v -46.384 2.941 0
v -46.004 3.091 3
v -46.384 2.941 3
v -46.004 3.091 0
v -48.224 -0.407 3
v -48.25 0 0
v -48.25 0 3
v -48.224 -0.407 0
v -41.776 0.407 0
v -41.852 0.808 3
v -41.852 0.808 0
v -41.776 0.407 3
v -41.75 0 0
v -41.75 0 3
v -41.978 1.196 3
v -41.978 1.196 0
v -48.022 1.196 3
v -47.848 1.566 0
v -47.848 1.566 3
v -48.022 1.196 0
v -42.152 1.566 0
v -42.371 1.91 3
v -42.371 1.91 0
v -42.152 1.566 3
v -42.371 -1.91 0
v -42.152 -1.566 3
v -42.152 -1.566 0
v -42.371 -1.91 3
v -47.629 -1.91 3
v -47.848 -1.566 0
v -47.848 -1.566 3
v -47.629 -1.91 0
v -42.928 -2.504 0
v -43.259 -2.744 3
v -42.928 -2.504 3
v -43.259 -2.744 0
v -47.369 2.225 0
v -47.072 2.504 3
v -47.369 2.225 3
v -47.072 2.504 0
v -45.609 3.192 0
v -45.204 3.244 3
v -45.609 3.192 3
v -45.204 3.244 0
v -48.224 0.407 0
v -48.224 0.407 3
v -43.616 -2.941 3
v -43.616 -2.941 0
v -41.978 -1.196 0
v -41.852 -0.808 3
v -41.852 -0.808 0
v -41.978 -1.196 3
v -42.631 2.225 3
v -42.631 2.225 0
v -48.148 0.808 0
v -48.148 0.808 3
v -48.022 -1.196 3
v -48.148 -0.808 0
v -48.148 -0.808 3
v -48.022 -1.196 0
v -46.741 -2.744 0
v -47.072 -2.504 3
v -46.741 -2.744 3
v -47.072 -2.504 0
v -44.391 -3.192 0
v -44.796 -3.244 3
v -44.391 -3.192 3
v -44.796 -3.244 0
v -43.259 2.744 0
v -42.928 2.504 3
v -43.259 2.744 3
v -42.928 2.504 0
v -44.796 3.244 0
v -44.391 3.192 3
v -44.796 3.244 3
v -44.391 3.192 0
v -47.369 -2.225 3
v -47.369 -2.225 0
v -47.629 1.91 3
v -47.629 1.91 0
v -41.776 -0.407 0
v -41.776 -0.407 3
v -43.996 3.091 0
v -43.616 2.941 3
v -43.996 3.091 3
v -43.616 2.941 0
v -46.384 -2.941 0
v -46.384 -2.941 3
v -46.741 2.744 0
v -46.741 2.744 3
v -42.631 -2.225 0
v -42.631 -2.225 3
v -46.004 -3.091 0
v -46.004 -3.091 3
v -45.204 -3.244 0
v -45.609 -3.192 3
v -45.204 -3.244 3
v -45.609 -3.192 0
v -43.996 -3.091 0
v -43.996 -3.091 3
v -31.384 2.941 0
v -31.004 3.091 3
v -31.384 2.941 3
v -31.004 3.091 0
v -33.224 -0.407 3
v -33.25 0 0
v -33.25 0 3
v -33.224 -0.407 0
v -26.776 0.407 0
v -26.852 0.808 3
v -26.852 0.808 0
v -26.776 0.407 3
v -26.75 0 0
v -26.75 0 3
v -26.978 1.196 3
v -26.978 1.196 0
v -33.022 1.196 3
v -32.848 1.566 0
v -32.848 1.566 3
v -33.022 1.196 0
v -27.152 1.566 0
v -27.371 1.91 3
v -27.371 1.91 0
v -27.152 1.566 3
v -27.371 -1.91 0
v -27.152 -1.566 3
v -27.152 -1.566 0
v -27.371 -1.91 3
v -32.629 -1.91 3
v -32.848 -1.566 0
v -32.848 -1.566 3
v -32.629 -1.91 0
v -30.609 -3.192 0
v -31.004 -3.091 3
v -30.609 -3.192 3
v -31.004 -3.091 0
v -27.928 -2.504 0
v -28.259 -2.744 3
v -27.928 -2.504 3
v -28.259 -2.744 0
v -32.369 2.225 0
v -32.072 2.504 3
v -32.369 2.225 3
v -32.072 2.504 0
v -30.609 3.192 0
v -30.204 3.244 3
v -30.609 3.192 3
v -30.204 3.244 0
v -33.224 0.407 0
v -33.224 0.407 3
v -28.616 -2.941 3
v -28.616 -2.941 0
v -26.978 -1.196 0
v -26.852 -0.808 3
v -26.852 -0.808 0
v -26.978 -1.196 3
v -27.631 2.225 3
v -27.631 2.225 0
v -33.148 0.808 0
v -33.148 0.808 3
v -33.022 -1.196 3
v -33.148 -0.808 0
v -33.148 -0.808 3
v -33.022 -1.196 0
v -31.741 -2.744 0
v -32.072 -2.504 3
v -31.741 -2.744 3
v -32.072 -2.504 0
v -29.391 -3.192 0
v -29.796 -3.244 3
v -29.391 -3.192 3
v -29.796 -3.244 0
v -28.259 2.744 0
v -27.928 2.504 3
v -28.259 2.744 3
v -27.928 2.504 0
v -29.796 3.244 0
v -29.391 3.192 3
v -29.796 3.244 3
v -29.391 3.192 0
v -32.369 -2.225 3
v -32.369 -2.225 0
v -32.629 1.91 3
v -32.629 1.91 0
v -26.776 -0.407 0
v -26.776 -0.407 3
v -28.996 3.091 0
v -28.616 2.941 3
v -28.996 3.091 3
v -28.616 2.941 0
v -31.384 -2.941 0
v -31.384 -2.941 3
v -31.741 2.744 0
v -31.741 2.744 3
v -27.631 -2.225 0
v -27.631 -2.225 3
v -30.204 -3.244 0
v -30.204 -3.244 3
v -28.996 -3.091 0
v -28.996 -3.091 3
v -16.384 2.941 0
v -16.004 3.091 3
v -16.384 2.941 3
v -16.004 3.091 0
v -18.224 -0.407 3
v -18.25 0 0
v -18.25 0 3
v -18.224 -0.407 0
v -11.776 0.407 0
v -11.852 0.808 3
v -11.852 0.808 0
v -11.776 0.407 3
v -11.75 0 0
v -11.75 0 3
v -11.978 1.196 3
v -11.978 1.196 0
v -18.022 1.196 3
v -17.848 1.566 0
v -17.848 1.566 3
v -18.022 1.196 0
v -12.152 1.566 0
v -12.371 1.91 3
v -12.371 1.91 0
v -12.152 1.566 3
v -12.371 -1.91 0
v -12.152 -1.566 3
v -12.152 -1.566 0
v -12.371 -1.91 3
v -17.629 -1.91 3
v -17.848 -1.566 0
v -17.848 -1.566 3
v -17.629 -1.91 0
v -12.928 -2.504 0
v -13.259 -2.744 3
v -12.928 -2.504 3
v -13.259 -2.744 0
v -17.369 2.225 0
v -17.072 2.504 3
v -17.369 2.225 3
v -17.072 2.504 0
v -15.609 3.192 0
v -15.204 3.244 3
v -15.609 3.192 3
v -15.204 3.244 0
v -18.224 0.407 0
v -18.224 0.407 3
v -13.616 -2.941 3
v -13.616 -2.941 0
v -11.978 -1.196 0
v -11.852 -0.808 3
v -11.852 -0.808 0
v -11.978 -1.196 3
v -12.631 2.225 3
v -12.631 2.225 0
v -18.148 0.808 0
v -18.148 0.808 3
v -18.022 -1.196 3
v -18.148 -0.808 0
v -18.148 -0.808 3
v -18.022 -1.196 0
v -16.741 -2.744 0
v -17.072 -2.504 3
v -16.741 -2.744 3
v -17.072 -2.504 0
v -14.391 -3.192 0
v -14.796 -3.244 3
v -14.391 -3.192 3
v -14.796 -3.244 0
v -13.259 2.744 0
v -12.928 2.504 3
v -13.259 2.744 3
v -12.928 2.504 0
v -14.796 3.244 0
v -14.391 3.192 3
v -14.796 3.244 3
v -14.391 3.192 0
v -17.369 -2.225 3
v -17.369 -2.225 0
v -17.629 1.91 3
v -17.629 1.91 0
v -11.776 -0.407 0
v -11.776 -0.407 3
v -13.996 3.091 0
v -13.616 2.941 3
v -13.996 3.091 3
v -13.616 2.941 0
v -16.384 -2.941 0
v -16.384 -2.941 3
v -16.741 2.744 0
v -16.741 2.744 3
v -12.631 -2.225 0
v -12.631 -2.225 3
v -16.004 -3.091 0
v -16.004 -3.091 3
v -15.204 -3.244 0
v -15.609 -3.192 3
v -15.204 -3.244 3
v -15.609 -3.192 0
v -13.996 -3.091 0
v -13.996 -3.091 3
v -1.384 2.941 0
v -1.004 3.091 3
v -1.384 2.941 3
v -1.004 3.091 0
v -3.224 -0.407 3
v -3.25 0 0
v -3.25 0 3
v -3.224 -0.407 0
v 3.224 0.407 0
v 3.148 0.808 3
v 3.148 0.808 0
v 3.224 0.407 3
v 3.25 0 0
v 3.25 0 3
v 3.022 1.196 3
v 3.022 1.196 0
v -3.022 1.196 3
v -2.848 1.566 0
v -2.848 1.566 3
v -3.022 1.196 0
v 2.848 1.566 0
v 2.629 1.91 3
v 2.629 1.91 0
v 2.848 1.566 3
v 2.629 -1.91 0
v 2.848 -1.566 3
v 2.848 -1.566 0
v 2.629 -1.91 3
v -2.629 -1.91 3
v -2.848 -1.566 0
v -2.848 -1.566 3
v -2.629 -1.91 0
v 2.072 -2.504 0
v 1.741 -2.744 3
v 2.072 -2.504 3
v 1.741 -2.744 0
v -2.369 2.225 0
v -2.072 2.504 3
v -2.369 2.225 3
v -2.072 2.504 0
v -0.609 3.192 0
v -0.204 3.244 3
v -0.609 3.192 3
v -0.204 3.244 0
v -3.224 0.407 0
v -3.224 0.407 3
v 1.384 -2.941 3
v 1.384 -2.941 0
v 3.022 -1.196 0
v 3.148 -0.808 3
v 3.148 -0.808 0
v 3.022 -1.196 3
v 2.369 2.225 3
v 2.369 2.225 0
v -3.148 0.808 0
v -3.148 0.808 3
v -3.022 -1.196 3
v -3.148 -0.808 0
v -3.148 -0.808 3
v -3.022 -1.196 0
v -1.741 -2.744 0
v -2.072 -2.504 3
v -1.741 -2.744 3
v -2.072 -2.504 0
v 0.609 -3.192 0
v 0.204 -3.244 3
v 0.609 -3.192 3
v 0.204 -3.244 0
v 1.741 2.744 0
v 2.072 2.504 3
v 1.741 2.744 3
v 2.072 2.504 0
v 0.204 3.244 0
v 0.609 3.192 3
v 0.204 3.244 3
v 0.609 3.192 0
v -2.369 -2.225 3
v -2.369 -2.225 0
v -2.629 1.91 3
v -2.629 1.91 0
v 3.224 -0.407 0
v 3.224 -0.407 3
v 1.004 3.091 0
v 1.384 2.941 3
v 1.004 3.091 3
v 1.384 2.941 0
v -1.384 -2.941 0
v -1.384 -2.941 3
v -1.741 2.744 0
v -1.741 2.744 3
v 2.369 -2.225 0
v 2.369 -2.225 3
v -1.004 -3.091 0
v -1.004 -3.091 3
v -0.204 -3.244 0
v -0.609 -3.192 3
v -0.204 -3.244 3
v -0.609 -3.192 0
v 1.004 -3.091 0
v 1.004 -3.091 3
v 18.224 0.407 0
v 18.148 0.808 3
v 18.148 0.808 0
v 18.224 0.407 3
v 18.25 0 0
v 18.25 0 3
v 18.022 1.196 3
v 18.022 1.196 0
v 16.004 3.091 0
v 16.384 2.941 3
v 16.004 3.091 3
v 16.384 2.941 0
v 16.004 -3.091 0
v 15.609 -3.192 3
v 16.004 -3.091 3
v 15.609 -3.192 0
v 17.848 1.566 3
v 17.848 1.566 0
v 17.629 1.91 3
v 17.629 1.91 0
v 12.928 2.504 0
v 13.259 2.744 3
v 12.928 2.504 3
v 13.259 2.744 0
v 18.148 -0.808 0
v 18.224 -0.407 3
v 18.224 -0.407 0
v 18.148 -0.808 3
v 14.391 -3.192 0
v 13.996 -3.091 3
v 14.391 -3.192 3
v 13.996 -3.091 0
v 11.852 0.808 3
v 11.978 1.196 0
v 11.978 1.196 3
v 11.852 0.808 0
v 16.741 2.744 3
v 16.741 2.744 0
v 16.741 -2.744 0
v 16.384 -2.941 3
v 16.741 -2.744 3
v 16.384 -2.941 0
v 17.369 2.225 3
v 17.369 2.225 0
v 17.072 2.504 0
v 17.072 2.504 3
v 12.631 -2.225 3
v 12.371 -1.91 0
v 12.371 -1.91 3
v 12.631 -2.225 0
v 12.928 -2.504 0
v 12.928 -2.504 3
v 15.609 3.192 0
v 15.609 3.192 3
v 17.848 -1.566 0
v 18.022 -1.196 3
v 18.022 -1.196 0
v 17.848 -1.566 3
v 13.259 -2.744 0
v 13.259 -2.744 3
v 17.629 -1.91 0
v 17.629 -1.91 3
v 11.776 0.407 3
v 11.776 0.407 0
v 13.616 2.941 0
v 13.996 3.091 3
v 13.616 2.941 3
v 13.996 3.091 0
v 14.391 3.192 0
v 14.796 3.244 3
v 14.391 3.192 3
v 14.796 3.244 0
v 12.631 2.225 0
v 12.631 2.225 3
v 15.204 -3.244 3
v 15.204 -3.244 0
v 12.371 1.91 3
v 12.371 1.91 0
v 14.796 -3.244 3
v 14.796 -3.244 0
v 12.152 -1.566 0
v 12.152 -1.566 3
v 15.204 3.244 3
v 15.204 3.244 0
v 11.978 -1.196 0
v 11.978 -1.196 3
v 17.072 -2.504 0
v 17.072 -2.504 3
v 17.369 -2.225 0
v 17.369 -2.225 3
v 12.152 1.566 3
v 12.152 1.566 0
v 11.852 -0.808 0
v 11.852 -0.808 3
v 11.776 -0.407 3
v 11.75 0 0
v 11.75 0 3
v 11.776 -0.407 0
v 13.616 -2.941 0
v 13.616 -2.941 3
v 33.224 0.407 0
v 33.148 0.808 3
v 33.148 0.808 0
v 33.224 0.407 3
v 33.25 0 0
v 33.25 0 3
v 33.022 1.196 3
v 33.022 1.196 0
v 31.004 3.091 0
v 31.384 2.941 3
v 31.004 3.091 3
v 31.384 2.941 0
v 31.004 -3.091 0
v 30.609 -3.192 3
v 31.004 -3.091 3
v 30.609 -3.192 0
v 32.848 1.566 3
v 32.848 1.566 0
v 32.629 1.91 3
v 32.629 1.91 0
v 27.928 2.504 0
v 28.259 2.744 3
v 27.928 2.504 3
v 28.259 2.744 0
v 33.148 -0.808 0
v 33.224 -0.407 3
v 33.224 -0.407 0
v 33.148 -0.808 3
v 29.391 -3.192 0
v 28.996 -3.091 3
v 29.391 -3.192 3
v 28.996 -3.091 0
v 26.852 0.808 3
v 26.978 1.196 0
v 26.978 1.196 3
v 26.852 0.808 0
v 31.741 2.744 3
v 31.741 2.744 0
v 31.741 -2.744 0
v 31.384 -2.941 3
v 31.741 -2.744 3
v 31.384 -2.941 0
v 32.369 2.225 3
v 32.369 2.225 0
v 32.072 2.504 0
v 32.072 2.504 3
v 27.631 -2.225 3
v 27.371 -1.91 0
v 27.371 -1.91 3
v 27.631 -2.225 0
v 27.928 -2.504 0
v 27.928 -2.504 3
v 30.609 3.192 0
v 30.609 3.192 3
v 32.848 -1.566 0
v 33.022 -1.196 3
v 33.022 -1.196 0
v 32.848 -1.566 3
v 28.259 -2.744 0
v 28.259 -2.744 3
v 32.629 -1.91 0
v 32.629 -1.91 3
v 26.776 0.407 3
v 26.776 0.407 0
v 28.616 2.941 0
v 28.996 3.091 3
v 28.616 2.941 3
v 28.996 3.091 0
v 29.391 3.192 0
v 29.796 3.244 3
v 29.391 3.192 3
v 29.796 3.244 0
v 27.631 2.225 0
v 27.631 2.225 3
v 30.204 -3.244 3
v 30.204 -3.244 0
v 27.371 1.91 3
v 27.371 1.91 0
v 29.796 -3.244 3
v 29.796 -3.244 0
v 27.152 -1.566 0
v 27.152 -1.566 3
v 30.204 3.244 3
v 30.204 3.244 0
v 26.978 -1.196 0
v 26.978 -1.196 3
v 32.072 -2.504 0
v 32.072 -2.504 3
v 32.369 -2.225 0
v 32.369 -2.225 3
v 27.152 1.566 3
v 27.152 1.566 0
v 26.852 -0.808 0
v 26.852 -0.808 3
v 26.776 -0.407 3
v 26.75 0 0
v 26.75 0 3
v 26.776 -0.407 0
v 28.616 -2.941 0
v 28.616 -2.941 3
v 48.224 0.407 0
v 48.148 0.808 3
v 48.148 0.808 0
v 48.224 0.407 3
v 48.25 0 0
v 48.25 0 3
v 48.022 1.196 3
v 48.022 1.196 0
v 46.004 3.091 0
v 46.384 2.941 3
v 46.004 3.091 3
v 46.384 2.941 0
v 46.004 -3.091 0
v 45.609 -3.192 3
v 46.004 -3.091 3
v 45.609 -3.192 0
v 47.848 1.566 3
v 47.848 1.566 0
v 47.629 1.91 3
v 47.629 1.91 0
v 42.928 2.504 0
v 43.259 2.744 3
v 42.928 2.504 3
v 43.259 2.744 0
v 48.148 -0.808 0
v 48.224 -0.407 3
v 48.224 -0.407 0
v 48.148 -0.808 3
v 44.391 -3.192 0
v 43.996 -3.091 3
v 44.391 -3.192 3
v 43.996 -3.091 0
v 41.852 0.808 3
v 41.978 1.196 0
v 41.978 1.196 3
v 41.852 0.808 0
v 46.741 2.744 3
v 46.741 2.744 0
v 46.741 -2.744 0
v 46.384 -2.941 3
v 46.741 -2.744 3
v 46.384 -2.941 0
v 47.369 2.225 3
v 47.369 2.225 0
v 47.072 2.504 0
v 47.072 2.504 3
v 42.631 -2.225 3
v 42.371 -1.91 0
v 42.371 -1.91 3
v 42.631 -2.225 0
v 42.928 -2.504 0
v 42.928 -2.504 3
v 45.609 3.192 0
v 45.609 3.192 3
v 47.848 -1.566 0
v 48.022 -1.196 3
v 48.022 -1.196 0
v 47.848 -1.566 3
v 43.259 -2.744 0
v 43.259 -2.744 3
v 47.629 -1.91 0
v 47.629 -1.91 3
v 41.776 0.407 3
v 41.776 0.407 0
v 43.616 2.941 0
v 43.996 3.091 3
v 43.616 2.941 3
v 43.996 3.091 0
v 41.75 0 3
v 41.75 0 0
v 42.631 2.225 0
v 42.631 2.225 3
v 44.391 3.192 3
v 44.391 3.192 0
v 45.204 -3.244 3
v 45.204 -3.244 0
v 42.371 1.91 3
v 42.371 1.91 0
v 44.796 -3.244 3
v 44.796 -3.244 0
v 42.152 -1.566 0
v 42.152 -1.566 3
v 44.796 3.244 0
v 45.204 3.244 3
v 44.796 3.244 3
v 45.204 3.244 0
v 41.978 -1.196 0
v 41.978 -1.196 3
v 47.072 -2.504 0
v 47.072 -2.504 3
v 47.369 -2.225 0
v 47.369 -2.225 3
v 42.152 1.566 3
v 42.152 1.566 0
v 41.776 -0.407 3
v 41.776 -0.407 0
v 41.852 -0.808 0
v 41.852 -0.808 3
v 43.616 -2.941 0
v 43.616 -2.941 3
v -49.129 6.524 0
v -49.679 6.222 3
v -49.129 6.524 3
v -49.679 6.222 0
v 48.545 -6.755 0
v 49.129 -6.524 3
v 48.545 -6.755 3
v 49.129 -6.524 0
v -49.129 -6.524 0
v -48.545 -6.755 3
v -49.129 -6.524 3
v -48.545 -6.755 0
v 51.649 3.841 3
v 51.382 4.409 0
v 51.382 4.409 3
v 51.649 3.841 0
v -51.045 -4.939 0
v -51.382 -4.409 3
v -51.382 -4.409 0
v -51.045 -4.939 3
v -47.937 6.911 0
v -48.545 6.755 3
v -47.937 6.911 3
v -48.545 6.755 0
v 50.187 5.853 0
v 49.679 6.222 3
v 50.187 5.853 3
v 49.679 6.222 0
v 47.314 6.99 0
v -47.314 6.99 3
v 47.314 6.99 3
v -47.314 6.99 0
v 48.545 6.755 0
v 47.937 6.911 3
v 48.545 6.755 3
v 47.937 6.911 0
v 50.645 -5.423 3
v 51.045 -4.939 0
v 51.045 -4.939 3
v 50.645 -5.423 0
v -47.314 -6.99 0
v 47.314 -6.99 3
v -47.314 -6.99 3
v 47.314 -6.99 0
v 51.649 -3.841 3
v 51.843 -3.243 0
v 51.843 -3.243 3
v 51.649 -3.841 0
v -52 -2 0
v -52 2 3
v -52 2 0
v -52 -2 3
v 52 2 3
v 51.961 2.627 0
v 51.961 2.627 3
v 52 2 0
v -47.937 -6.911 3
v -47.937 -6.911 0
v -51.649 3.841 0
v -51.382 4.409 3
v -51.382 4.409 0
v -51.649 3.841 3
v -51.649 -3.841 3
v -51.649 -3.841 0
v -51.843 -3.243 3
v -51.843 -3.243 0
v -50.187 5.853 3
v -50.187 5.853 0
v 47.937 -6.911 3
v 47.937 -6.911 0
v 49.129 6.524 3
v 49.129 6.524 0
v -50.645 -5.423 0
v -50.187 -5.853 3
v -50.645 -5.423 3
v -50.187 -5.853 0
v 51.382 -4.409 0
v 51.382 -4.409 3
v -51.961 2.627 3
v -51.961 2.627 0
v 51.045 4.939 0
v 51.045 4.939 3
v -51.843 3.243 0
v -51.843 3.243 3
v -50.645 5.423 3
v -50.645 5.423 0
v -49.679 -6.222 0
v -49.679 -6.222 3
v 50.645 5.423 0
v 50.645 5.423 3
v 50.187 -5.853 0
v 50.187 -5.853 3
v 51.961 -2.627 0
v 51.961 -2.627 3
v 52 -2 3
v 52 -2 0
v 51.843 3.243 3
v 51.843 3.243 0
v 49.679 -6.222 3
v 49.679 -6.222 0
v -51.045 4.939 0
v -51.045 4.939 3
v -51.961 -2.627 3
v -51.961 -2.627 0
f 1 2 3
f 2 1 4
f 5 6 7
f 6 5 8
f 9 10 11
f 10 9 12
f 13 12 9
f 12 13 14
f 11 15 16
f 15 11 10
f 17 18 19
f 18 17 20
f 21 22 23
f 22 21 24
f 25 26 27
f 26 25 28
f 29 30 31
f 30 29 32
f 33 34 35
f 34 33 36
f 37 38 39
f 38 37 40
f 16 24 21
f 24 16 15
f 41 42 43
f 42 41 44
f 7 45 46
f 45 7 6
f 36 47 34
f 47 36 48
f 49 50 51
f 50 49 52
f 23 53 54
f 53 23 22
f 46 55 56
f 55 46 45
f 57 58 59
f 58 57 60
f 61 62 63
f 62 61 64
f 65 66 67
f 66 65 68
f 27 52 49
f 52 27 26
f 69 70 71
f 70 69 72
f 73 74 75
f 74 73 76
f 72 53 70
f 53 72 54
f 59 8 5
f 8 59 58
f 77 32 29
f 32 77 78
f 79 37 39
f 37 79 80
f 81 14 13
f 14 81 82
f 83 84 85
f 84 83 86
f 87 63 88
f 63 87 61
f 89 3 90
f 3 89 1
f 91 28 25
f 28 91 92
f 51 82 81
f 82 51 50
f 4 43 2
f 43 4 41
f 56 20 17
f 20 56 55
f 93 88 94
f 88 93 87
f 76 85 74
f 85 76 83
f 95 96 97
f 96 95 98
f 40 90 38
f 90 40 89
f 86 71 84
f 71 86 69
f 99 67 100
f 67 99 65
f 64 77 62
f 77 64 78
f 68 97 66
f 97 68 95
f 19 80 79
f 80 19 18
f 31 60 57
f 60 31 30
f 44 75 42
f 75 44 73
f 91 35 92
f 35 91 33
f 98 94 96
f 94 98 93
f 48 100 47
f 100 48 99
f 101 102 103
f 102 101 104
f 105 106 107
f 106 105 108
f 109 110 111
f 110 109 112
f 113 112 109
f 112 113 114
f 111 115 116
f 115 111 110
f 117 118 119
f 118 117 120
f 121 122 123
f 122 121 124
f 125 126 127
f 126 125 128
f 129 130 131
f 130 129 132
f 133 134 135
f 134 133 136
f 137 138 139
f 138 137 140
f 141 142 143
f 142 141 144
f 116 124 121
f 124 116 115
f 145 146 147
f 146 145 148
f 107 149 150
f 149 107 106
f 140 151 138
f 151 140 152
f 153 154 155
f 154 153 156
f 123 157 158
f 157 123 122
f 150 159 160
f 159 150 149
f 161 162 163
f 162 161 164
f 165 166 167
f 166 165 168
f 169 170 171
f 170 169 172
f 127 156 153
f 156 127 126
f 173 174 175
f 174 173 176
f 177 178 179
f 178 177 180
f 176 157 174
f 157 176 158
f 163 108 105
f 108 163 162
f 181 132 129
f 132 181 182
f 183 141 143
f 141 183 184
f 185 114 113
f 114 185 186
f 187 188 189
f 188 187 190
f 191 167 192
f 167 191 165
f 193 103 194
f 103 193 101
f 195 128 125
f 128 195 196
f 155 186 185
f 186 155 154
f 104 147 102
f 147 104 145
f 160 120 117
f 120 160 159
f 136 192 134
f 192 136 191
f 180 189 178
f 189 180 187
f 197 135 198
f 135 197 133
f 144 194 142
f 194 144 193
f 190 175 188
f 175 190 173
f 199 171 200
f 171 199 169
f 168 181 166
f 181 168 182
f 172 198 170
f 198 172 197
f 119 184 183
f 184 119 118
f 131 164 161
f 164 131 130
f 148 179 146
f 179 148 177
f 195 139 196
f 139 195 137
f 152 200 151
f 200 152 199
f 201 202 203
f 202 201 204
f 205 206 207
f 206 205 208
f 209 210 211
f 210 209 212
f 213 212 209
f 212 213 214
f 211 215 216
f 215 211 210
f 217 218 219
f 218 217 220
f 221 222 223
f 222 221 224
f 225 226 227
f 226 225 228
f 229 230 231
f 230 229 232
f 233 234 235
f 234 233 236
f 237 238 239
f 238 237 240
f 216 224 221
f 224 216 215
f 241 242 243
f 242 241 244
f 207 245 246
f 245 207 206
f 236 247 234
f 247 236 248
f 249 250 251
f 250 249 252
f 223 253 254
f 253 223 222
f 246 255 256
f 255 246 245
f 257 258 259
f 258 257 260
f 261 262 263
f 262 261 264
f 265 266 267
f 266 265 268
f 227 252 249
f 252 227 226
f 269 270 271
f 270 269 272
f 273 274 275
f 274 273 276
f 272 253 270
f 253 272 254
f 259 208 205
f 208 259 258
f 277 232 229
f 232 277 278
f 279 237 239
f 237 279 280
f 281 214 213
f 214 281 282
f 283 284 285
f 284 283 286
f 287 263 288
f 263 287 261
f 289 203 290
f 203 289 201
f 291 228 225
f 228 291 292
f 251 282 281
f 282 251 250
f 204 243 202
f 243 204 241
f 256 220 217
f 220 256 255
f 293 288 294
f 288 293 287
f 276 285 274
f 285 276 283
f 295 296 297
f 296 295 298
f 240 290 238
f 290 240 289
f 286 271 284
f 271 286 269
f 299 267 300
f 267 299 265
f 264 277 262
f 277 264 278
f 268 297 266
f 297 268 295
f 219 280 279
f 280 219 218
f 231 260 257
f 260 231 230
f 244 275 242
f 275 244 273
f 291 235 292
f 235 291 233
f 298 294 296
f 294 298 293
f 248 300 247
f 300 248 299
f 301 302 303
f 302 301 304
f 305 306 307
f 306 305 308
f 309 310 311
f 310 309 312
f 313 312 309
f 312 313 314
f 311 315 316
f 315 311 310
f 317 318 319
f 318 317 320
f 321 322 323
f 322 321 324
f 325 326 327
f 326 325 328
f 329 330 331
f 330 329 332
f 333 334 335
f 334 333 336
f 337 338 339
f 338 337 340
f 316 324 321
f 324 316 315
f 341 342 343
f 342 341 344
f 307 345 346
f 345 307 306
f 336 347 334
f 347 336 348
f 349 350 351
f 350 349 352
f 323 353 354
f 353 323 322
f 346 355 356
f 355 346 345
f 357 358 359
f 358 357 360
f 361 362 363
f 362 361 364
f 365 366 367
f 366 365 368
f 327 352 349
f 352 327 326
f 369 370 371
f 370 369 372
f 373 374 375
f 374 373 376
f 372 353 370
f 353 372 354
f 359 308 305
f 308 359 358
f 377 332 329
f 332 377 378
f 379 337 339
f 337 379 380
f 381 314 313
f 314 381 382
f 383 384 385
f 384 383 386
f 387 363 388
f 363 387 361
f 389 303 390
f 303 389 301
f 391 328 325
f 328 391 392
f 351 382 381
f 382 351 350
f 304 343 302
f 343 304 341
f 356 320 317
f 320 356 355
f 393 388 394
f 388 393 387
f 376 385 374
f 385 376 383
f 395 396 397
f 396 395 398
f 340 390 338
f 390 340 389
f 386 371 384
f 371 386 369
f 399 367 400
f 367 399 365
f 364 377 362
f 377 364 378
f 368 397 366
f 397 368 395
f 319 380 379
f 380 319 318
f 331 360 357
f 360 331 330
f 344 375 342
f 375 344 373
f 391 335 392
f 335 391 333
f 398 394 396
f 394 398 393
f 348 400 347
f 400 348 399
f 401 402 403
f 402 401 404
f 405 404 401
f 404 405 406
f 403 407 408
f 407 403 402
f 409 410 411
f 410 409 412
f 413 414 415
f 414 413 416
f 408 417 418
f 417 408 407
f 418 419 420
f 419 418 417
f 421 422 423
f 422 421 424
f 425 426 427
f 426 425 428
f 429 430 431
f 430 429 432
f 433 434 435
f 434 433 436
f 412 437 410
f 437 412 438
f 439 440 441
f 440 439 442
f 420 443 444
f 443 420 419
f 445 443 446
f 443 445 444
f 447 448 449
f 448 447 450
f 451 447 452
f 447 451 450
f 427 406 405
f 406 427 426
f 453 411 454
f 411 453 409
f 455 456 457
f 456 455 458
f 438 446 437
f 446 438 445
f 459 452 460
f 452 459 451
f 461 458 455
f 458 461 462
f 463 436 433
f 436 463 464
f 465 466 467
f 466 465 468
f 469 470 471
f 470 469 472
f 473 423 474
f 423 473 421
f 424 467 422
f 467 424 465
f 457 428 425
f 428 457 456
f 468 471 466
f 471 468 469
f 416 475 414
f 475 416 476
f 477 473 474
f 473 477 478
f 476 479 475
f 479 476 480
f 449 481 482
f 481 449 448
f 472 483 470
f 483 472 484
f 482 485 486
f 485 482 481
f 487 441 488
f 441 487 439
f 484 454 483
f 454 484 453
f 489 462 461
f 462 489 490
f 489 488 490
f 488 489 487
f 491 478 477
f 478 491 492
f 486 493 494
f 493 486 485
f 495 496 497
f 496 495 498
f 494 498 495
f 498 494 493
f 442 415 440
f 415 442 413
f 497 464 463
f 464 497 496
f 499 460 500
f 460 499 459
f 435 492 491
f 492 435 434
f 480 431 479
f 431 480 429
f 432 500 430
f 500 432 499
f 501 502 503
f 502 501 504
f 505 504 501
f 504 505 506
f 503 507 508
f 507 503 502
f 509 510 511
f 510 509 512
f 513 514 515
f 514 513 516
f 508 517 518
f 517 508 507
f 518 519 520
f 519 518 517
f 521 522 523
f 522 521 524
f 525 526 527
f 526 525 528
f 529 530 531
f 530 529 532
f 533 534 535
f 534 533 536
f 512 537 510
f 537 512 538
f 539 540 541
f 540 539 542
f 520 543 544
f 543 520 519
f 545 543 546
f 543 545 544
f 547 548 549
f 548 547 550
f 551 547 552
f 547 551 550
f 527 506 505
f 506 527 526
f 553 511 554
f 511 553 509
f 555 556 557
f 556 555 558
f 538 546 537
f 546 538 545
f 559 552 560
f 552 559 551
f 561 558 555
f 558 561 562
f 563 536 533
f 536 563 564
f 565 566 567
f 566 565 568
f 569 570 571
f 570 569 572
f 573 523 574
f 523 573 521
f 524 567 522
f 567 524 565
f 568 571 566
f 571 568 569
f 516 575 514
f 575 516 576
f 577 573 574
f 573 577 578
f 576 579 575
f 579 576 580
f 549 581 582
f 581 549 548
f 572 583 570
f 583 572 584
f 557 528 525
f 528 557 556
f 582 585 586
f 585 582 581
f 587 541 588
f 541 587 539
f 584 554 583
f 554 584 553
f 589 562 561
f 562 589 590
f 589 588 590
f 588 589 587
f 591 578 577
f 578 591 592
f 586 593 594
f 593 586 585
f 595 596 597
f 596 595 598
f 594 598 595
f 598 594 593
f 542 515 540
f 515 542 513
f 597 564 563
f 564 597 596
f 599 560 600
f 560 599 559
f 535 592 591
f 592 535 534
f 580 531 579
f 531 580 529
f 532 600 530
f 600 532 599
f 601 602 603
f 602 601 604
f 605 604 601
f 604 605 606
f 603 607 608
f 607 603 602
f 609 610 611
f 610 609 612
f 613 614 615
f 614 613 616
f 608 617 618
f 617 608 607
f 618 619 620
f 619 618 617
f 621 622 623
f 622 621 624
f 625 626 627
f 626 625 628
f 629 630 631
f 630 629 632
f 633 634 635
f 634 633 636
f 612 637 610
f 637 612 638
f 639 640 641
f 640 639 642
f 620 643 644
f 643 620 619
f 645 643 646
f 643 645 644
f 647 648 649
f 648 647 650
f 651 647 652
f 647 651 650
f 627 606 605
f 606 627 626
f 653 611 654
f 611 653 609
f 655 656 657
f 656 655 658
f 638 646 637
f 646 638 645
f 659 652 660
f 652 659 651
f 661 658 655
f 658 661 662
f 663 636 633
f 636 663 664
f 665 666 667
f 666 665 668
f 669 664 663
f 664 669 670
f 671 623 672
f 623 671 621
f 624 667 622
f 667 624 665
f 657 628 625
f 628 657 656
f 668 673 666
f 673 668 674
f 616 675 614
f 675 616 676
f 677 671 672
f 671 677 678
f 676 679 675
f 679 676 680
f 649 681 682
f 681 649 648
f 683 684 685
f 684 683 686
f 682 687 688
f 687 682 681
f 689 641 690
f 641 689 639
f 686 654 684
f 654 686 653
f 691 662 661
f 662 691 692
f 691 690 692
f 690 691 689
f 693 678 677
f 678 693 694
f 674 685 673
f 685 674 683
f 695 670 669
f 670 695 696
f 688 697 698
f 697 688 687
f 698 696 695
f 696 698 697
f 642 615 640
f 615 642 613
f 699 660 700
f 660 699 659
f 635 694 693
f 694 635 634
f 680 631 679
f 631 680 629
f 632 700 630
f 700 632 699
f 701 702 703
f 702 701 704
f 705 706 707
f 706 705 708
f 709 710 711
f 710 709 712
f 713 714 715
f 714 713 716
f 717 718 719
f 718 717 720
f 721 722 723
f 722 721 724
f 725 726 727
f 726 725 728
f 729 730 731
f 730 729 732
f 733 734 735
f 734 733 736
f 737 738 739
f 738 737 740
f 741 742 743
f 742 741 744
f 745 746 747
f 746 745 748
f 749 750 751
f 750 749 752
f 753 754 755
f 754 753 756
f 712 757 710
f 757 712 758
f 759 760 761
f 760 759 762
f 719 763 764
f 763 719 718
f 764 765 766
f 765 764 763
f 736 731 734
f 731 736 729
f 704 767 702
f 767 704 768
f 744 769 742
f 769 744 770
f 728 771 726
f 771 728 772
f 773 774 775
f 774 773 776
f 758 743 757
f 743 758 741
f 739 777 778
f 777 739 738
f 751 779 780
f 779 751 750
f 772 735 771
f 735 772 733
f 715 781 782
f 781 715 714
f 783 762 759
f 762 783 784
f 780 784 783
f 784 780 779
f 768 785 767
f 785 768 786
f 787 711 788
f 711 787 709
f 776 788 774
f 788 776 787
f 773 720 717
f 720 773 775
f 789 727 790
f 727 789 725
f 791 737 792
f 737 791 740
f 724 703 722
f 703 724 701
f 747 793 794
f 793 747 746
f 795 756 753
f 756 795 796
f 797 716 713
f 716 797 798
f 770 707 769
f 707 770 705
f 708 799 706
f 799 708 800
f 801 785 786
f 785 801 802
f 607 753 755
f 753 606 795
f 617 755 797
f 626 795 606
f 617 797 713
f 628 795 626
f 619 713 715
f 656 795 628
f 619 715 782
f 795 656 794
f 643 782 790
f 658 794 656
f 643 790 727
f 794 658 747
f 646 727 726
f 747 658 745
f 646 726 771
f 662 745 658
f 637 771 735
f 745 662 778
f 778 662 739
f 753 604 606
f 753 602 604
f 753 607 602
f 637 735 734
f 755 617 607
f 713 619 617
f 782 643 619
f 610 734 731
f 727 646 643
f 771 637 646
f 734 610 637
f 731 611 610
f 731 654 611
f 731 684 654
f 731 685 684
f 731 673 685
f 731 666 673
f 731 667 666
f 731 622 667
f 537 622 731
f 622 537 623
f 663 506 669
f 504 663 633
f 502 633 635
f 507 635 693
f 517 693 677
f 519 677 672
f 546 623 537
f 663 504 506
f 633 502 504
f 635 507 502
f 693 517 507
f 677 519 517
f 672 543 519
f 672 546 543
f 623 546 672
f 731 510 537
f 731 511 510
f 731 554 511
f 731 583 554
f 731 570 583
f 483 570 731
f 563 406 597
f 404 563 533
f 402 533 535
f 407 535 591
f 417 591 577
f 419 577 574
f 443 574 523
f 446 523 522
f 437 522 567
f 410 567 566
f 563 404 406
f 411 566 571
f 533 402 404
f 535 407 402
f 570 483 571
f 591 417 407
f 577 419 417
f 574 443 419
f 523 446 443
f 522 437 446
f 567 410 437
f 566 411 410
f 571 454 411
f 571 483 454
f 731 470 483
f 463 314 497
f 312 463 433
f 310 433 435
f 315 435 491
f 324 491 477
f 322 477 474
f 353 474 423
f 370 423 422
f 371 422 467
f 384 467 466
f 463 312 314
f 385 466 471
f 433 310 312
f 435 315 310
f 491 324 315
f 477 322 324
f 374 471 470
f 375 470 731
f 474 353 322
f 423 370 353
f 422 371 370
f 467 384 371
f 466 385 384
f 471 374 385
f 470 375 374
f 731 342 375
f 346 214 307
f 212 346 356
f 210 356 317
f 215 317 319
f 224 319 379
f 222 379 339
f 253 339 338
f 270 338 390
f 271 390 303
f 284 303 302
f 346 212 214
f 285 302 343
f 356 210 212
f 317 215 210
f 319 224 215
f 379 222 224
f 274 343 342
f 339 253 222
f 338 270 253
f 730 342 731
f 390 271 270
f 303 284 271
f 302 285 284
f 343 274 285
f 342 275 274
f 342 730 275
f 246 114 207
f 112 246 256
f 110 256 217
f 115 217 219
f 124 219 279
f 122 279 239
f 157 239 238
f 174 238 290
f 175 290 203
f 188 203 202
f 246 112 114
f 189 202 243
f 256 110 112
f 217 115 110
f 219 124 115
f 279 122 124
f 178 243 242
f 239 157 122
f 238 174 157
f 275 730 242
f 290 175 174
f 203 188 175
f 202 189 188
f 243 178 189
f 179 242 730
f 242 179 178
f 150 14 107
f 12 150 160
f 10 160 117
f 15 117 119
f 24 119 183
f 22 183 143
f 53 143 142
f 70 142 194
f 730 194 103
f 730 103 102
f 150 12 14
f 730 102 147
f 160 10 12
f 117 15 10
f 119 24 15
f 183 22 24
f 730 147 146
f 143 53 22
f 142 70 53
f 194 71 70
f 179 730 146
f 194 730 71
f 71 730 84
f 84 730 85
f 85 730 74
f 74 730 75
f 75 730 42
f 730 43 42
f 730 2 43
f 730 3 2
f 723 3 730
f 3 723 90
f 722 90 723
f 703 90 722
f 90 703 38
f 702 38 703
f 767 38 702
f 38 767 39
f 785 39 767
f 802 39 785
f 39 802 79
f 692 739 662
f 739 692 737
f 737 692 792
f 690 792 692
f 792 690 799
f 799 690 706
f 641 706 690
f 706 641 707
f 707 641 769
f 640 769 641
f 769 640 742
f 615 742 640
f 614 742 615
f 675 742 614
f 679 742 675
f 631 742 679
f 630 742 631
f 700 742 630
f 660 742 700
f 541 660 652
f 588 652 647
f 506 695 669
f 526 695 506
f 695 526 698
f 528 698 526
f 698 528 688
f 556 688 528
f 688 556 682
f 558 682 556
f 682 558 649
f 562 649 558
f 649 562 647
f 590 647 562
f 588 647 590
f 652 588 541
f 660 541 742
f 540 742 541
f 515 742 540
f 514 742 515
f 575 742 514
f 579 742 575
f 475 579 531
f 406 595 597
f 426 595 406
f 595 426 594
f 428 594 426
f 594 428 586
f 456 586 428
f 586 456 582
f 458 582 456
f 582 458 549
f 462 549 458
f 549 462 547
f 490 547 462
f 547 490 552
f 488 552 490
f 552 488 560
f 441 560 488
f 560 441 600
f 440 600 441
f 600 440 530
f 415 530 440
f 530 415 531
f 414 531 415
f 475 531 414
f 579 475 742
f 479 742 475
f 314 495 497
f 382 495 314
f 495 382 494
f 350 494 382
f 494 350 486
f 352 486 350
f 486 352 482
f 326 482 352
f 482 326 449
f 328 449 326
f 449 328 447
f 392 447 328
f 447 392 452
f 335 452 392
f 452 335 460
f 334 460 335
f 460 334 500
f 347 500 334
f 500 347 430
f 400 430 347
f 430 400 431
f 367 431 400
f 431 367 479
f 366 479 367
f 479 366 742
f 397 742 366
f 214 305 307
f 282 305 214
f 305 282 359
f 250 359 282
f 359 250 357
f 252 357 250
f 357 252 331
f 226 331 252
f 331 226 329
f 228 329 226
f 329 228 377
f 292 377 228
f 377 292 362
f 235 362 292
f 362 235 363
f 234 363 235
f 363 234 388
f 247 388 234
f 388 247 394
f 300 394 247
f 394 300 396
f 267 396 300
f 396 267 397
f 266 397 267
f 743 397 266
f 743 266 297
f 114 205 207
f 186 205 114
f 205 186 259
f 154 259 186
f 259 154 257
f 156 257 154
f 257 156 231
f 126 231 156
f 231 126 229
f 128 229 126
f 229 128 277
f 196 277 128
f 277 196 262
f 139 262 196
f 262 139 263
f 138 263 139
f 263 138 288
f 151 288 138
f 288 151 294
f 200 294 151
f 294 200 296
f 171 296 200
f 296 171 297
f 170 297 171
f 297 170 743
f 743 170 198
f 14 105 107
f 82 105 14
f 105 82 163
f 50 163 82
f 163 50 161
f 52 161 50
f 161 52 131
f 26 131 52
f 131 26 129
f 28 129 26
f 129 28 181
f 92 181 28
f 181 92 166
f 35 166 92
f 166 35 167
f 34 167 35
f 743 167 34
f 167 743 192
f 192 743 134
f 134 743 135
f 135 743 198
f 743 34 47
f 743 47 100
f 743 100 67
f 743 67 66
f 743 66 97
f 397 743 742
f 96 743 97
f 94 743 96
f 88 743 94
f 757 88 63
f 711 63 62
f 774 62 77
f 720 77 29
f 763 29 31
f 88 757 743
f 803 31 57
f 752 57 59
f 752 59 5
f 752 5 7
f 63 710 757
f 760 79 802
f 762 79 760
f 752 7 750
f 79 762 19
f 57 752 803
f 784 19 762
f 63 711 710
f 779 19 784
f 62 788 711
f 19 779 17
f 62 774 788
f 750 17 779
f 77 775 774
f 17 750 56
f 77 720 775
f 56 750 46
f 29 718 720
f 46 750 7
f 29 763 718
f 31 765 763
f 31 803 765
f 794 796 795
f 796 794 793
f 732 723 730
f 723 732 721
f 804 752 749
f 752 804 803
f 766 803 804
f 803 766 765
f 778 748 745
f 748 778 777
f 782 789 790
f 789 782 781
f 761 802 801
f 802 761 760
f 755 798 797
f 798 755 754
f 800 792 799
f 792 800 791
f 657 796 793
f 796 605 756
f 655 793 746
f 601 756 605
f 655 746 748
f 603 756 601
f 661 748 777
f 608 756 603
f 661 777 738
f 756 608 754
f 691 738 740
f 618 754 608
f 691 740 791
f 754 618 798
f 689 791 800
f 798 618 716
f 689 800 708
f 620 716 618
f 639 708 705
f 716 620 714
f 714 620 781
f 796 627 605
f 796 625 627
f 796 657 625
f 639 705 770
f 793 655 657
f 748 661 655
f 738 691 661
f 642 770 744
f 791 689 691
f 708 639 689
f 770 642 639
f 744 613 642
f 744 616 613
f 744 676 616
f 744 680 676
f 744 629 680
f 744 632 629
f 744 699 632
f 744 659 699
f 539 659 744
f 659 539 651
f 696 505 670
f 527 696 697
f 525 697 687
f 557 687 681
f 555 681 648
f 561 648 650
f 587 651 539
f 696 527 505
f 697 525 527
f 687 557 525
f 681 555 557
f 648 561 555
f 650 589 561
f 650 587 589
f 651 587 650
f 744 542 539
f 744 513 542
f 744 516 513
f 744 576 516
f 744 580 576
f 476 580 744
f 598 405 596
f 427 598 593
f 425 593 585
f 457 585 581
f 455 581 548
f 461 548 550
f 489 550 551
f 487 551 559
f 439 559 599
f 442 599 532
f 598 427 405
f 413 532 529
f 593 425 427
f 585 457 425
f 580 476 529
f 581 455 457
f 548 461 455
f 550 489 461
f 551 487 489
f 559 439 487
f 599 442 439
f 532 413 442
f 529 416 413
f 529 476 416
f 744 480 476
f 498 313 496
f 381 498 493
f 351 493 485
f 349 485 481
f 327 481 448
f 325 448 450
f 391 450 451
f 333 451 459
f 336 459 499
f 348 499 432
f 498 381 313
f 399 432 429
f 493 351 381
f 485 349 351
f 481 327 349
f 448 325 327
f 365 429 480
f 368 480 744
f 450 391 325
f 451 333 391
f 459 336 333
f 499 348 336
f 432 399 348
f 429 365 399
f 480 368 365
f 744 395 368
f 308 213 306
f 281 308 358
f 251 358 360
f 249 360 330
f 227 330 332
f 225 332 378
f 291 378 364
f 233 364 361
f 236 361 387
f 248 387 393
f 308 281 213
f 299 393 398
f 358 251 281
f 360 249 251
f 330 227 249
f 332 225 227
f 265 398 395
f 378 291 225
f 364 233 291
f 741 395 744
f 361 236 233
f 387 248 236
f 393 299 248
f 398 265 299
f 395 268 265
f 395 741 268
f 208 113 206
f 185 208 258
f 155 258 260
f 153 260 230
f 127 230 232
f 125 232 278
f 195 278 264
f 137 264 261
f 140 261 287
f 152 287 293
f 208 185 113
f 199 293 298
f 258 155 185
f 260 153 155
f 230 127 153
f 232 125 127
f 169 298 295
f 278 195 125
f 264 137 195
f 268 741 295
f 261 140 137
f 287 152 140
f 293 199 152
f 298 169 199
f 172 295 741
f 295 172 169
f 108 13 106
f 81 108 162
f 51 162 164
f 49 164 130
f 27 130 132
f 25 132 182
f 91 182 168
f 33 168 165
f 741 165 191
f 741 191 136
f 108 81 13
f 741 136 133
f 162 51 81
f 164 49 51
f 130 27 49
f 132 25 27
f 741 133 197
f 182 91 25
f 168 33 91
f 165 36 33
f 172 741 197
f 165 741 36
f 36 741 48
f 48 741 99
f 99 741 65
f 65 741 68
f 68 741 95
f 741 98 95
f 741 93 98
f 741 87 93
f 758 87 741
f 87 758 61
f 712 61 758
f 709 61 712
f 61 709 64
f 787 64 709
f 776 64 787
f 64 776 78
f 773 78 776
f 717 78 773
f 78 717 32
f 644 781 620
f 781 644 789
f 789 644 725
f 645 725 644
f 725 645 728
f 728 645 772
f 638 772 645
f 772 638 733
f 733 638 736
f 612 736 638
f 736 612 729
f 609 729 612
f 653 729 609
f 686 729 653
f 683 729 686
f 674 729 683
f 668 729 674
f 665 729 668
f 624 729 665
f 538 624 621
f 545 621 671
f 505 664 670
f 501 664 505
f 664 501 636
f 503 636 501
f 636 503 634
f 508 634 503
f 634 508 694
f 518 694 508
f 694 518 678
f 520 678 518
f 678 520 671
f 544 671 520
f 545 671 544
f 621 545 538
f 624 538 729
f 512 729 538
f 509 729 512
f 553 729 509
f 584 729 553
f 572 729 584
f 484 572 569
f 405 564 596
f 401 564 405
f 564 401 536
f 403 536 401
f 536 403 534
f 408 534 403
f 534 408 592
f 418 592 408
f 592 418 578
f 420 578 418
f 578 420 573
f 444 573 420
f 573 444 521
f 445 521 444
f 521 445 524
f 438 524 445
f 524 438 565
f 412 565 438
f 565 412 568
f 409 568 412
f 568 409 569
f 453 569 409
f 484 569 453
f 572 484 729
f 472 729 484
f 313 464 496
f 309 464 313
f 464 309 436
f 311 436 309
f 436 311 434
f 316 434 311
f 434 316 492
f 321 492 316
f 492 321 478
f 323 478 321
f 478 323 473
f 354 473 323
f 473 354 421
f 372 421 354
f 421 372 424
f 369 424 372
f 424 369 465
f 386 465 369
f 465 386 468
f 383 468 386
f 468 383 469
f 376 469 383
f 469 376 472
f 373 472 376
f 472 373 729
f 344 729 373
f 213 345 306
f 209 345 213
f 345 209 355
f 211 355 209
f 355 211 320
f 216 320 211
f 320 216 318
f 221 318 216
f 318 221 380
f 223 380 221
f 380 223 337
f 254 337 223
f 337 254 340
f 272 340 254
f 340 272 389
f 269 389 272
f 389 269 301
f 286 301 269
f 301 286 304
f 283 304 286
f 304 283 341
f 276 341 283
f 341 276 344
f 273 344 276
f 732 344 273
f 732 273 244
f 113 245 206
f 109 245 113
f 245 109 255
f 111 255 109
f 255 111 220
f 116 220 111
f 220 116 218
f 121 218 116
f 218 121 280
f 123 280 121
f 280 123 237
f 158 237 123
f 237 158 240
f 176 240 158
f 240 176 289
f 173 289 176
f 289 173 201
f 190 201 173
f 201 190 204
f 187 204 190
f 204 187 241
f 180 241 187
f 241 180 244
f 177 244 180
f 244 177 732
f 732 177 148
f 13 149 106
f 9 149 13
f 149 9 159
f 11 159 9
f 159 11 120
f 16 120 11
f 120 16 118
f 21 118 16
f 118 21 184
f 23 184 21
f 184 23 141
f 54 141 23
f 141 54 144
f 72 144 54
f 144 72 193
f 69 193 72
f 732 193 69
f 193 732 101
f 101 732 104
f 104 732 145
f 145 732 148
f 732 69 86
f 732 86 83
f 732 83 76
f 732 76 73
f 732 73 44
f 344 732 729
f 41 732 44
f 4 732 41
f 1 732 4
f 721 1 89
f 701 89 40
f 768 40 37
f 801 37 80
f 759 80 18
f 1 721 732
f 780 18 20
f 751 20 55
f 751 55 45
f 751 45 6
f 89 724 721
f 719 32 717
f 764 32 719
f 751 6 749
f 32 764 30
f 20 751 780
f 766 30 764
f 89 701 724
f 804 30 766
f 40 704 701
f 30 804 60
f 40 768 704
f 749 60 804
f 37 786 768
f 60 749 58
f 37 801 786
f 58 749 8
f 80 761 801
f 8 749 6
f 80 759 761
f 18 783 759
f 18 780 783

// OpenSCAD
// Generated by SolidPython 1.1.3 on 2023-03-12 22:44:41
$fn = 50;


difference() {
	union() {
		translate(v = [0, 0, 0]) {
			rotate(a = [0, 0, 0]) {
				hull() {
					translate(v = [-47.0000000000, 2.0000000000, 0]) {
						rotate(a = [0, 0, 0]) {
							translate(v = [0, 0, 0]) {
								rotate(a = [0, 0, 0]) {
									cylinder(h = 3, r = 5);
								}
							}
						}
					}
					translate(v = [47.0000000000, 2.0000000000, 0]) {
						rotate(a = [0, 0, 0]) {
							translate(v = [0, 0, 0]) {
								rotate(a = [0, 0, 0]) {
									cylinder(h = 3, r = 5);
								}
							}
						}
					}
					translate(v = [-47.0000000000, -2.0000000000, 0]) {
						rotate(a = [0, 0, 0]) {
							translate(v = [0, 0, 0]) {
								rotate(a = [0, 0, 0]) {
									cylinder(h = 3, r = 5);
								}
							}
						}
					}
					translate(v = [47.0000000000, -2.0000000000, 0]) {
						rotate(a = [0, 0, 0]) {
							translate(v = [0, 0, 0]) {
								rotate(a = [0, 0, 0]) {
									cylinder(h = 3, r = 5);
								}
							}
						}
					}
				}
			}
		}
	}
	union() {
		translate(v = [-45.0000000000, 0.0000000000, 0]) {
			rotate(a = [0, 0, 0]) {
				translate(v = [0, 0, -50]) {
					rotate(a = [0, 0, 0]) {
						cylinder(h = 100, r = 3.2500000000);
					}
				}
			}
		}
		translate(v = [-30.0000000000, 0.0000000000, 0]) {
			rotate(a = [0, 0, 0]) {
				translate(v = [0, 0, -50]) {
					rotate(a = [0, 0, 0]) {
						cylinder(h = 100, r = 3.2500000000);
					}
				}
			}
		}
		translate(v = [-15.0000000000, 0.0000000000, 0]) {
			rotate(a = [0, 0, 0]) {
				translate(v = [0, 0, -50]) {
					rotate(a = [0, 0, 0]) {
						cylinder(h = 100, r = 3.2500000000);
					}
				}
			}
		}
		translate(v = [0.0000000000, 0.0000000000, 0]) {
			rotate(a = [0, 0, 0]) {
				translate(v = [0, 0, -50]) {
					rotate(a = [0, 0, 0]) {
						cylinder(h = 100, r = 3.2500000000);
					}
				}
			}
		}
		translate(v = [15.0000000000, 0.0000000000, 0]) {
			rotate(a = [0, 0, 0]) {
				translate(v = [0, 0, -50]) {
					rotate(a = [0, 0, 0]) {
						cylinder(h = 100, r = 3.2500000000);
					}
				}
			}
		}
		translate(v = [30.0000000000, 0.0000000000, 0]) {
			rotate(a = [0, 0, 0]) {
				translate(v = [0, 0, -50]) {
					rotate(a = [0, 0, 0]) {
						cylinder(h = 100, r = 3.2500000000);
					}
				}
			}
		}
		translate(v = [45.0000000000, 0.0000000000, 0]) {
			rotate(a = [0, 0, 0]) {
				translate(v = [0, 0, -50]) {
					rotate(a = [0, 0, 0]) {
						cylinder(h = 100, r = 3.2500000000);
					}
				}
			}
		}
	}
}
/***********************************************
*********      SolidPython code:      **********
************************************************
 
from solid import *
import os
import subprocess

import oomB

import opsc_library_gen

mode = "laser"
#mode = "3d_print"

defined_objects = {}

radius_dict = {}
countersunk_dict = {}


def set_mode(m):
    global mode
    mode = m
    radius_dict['M6'] = 6.5/2
    radius_dict['M3'] = 3.3/2
    if mode == "laser":
        radius_dict['M6'] = 6/2
        radius_dict['M3'] = 3/2

    countersunk_dict['M3'] = {}
    countersunk_dict['M3']['little_rad'] = radius_dict['M3']
    countersunk_dict['M3']['big_rad'] = (5.5+0.6)/2
    if mode == "laser":
        countersunk_dict['M3']['big_rad'] = (4.75+0.6)/2
        countersunk_dict['M3']['little_rad'] = (4.75+0.6)/2

    countersunk_dict['M3']['height'] = 1.7


def opsc_make_object(filename, objects, save_type="none",resolution=50, layers = 1, tilediff = 200, mode="laser", overwrite=True):
    if overwrite or not os.path.exists(filename):
        set_mode(mode)
        save_type = save_type.lower()
        os.makedirs(os.path.dirname(filename), exist_ok=True)
        final_object = opsc_get_object(objects, mode = mode)
        # Save the final object to the specified filename    
        scad_render_to_file(final_object, filename, file_header='$fn = %s;' % resolution, include_orig_code=True)
        if mode == "laser":
            filename_laser = filename.replace(".scad","-flat.scad")
            scad_render_to_file(getLaser(final_object, layers=layers, tilediff=tilediff), filename_laser, file_header='$fn = %s;' % resolution, include_orig_code=True)
            if save_type == "all":
                saveToAll(filename_laser)
            elif save_type == "dxf":
                saveToDxf(filename_laser)
        if save_type == "all":
            saveToAll(filename)
        elif save_type == "dxf":
            saveToDxf(filename)


def opsc_get_object(objects, mode = "laser"):
    # Create the solidpython objects only include the positive objects and if they don't have inclusion or their inclusion is either all or mode
    # Initialize an empty list to store the results
    positive_objects = []

    # Iterate over the "objects" list
    for obj in objects:
        # Check if the current object has a "type" key with a value of "positive"
        if obj['type'] == 'positive':
            # Check if the current object has an "inclusion" key and its value matches "mode",
            # or if the current object does not have an "inclusion" key at all
            if not 'inclusion' in obj or obj['inclusion'] == "all" or obj['inclusion'] == mode:
                # Call the "get_opsc_item" function with the current object as an argument
                opsc_item = get_opsc_item(obj)
                # Add the result to the "positive_objects" list
                positive_objects.append(opsc_item)
# Initialize an empty list to store the results
    negative_objects = []

    # Iterate over the "objects" list
    for obj in objects:
        # Check if the current object has a "type" key with a value of "negative"
        if obj['type'] == 'negative':
            # Check if the current object has an "inclusion" key and its value matches "mode",
            # or if the current object does not have an "inclusion" key at all
            if not 'inclusion' in obj or obj['inclusion'] == "all" or obj['inclusion'] == mode:
                # Call the "get_opsc_item" function with the current object as an argument
                opsc_item = get_opsc_item(obj)
                # Add the result to the "negative_objects" list
                negative_objects.append(opsc_item)
    
    #positive_objects = [get_opsc_item(obj) for obj in objects if obj['type'] == 'positive']
    #negative_objects = [get_opsc_item(obj) for obj in objects if obj['type'] == 'negative']
    # Union the positive objects
    positive_object = union()(*positive_objects)
    # Union the negative objects
    negative_object = union()(*negative_objects)
    # Create the final object by subtracting the negative objects from the positive objects
    return difference()(positive_object, negative_object)

def get_opsc_item(params):
    # A dictionary to map radius string values to numerical values
    #radius_dict = {'small': 5, 'medium': 10, 'large': 15}
    # An array of function names for basic shapes
    basic_shapes = ['cube', 'sphere', 'cylinder']
    
    # An array of function names for other shapes
    other_shapes = ['hole', 'slot', 'rounded_rectangle', 'countersunk']
    


    # Convert radius to r if present, and remove radius from the params dictionary
    if 'radius' in params:
        if isinstance(params['radius'], str):
            # Use the radius_dict to map the radius string value to a numerical value
            params['r'] = radius_dict[params['radius']]
        else:
            params['r'] = params['radius']
        del params['radius']
    

    # Check if the object type is a basic shape
    if params['shape'] in basic_shapes:
        # Remove shape and unexpected dictionary values
        allowed_keys = {'size', 'r', 'r1', 'r2', 'd', 'h', 'rw', 'rh', 'dw', 'dh'}
        shape_params = {k: v for k, v in params.items() if k in allowed_keys}

        # Call the corresponding function for the shape parameter, using ** notation to pass the shape_params dictionary as keyword arguments
        return get_opsc_transform(params,globals()[params['shape']](**shape_params))
    
    # If the object type is not a basic shape, check if it's a defined object or one of the other shapes
    elif params['shape'] in other_shapes:
        # Call the corresponding function for the shape parameter, passing the params dictionary as an argument
        p2 = copy.deepcopy(params)
        p2["pos"] = [0,0,0]
        return get_opsc_transform(params,globals()[params['shape']](p2))
    
    # If the object is not a basic shape or a defined object, try to import it from a .scad file
    else:
        obj = defined_objects[params['shape']]
        return get_opsc_transform(params,obj)

def get_opsc_transform(params, solid_obj):
    # Rotate the object based on the 'rot' field in the params dictionary, or the 'rotX', 'rotY', and 'rotZ' fields if 'rot' is not present
    rot = params.get('rot', [])
    if rot:
        rotX, rotY, rotZ = rot
    else:
        rotX = params.get('rotX', 0)
        rotY = params.get('rotY', 0)
        rotZ = params.get('rotZ', 0)
    solid_obj = rotate([rotX, rotY, rotZ])(solid_obj)

    # Translate the object based on the 'pos' field in the params dictionary, or the 'x', 'y', and 'z' fields if 'pos' is not present
    pos = params.get('pos', [])
    if pos:
        x, y, z = pos
    else:
        x = params.get('x', 0)
        y = params.get('y', 0)
        z = params.get('z', 0)
    solid_obj = translate([x, y, z])(solid_obj)
    return solid_obj


import random

def opsc_easy_array(type, shape, repeats, pos_start, shift_arr, **kwargs):
    for i in range(0,3):
        repeats.append(1)
        pos_start.append(0)
        shift_arr.append(0)
    return_objects = []

    for x in range(0,repeats[0]):
        for y in range(0,repeats[1]):
            for z in range(0,repeats[2]):
                return_objects.append(opsc_easy(type, shape, pos=[pos_start[0]+x*shift_arr[0],pos_start[1]+y*shift_arr[1],pos_start[2]+z*shift_arr[2]], **kwargs))
    return return_objects                



def opsc_easy(type, shape, **kwargs):
    obj = {
        'type': type,
        'shape': shape
    }
    for param in ['size', 'r', 'r1', 'r2', 'd', 'h', 'rw', 'rh', 'dw', 'dh', 'pos', 'x', 'y', 'z', 'rot', 'rotX', 'rotY', 'rotZ', "w", "inclusion"]:
        if param in kwargs:
            obj[param] = kwargs[param]
    return obj

def hole(params):
    p2 = copy.deepcopy(params)  
    # Check if the radius is a string and replace it with the corresponding value from the dictionary
    if isinstance(p2['r'], str):
        p2['r'] = radius_dict[p2['r']]
    
    # Set the height to 100 if not specified
    if 'h' not in p2:
        p2['h'] = 100
        p2["pos"] = [0,0,-50]
    p2["center"] = True
    # Create the cylinder object
    p2["shape"] = "cylinder"
    p2["type"] = "positive"

    return get_opsc_item(p2)

import copy

def countersunk(params):
    p2 = copy.deepcopy(params)
    counter_rad = p2['r']
    p2['r'] = radius_dict[p2['r']]
    hp = copy.deepcopy(p2)
    hp["type"] = "positive"
    hp["shape"] = "hole"
    del hp["rot"]
    hol = get_opsc_item(hp)
    
    cp = copy.deepcopy(p2)
    cp["h"] = countersunk_dict[counter_rad]["height"]
    cp["r2"] = countersunk_dict[counter_rad]["little_rad"]
    cp["r1"] = countersunk_dict[counter_rad]["big_rad"]
    del cp["r"]
    del cp["rot"]
    cp["type"] = "positive"
    cp["shape"] = "cylinder"
    cp["pos"] = [0,0,0]

    top = get_opsc_item(cp)
    return union()(hol,top)



def slot(params):  
    p2 = copy.deepcopy(params) 
    if isinstance(p2['r'], str):
        p2['r'] = radius_dict[p2['r']]
    p2["type"] = "positive"
    p2["shape"] = "hole"
    del p2["rot"]
    p2["pos"] = [0,0,0]
    left = copy.deepcopy(p2)
    right = copy.deepcopy(p2)
    left["pos"][0] = p2["w"] / 2 - p2["r"] 
    
    right["pos"][0] = -p2["w"] / 2 + p2["r"] 
    pass
    leftObj = get_opsc_item(left)
    rightObj = get_opsc_item(right)
    return hull()(leftObj, rightObj)

def rounded_rectangle(params):   
    p2 = copy.deepcopy(params) 
    p2["h"] = p2["size"][2]
    p2["pos"] = p2.get("pos", [0, 0, 0]) 
    p2["type"] = "positive"
    p2["shape"] = "hole"
    p2["pos"] = [0,0,0]
    
    if 'rot' in p2:
        del p2["rot"]   
    if 'r' not in p2:
        p2["r"] = 5 
    tl = copy.deepcopy(p2)
    tr = copy.deepcopy(p2)
    bl = copy.deepcopy(p2)
    br = copy.deepcopy(p2)
    tl["pos"][0] = -(p2["size"][0] - p2["r"]*2)/2
    tl["pos"][1] = (p2["size"][1] - p2["r"]*2)/2
    tr["pos"][0] = (p2["size"][0] - p2["r"]*2)/2
    tr["pos"][1] = (p2["size"][1] - p2["r"]*2)/2
    bl["pos"][0] = -(p2["size"][0] - p2["r"]*2)/2
    bl["pos"][1] = -(p2["size"][1] - p2["r"]*2)/2
    br["pos"][0] = (p2["size"][0] - p2["r"]*2)/2
    br["pos"][1] = -(p2["size"][1] - p2["r"]*2)/2
    del tl["size"]
    del tr["size"]
    del bl["size"]
    del br["size"]
    tlo = get_opsc_item(tl)
    tro = get_opsc_item(tr)
    blo = get_opsc_item(bl)
    bro = get_opsc_item(br)    
    return hull()(tlo, tro, blo, bro)



def import_scad_object(filename):
    # Import the .scad file and convert it to a solidpython object
    #filename = "parts"
    obj = import_scad(filename)
    return obj.main()
    


import os
import solid as solidpython

# A dictionary to store the defined objects


def load_scad_objects():
    opsc_library_gen.gen_library(defined_objects)

import random

def test(num_objects):
    objects = []
    for i in range(num_objects):
        # Choose a random shape
        #shape = random.choice(['cube', 'sphere', 'cylinder', 'hole', 'slot', "rounded_rectangle"])
        shape = random.choice(["rounded_rectangle"])

        # Choose a random type
        type = random.choice(['positive', 'negative'])
        
        # Create an empty object dictionary
        obj = {'shape': shape, 'type': type}
        
        # Set shape-specific parameters
        if obj['shape'] in ['cube']:
            obj['size'] =  [random.uniform(5, 15), random.uniform(5, 15), random.uniform(5, 15)]
        if obj['shape'] in ['rounded_rectangle']:
            obj['size'] =  [random.uniform(5, 15), random.uniform(5, 15), random.uniform(5, 15)]
            obj['r'] = random.uniform(0.5, 5)
        elif obj['shape'] == 'sphere':
            obj['r'] = random.uniform(5, 15)
        elif obj['shape'] in ['cylinder', 'hole']:
            obj['r'] = random.uniform(0.5, 5)
            obj['h'] = random.uniform(5, 15)
        elif obj['shape'] == 'slot':
            obj['r'] = random.uniform(0.5, 5)
            obj['h'] = random.uniform(5, 15)
            obj['w'] = random.uniform(5, 15)
        
        # Set a random position and rotation
        obj['pos'] = [random.uniform(-20, 20), random.uniform(-20, 20), random.uniform(-20, 20)]
        obj['rot'] = [random.uniform(-180, 180), random.uniform(-180, 180), random.uniform(-180, 180)]
        
        # Add the object to the list
        objects.append(obj)
    return objects

####### old file saving
def saveToAll(fileIn):
    saveToDxf(fileIn)
    saveToPng(fileIn)
    saveToStl(fileIn)
    saveToSvg(fileIn)

def saveToDxf(fileIn, fileOut="", copy_to_laser=True):
    if fileOut == "":
        fileOut = fileIn.replace(".scad",".dxf")
    saveToFile(fileIn, fileOut)


    
def saveToPng(fileIn, fileOut="",extra="--render"):
    if fileOut == "":
        fileOut = fileIn.replace(".scad",".png")
    saveToFile(fileIn, fileOut)

def saveToStl(fileIn, fileOut=""):
    if fileOut == "":
        fileOut = fileIn.replace(".scad",".stl")
    saveToFile(fileIn, fileOut)
    
def saveToSvg(fileIn, fileOut=""):
    if fileOut == "":
        fileOut = fileIn.replace(".scad",".svg")
    saveToFile(fileIn, fileOut)

def saveToFile(fileIn, fileOut,extra=""):
    #extra = extra + " --colorscheme Tomorrow"

    launchStr = 'openscad -o "' + fileOut + '"' + extra + ' "' + fileIn + '"'
    if ".png" in fileOut:
        launchStr = launchStr + " --render"
    print("            saveToFile launch string: " + launchStr)
    subprocess.run(launchStr)
    x=0

def getLaser(final_object,start=1.5,layers=1,thickness=3,tilediff=200):
        rv= []

        for x in range(layers):
            rv.append(translate([0,x*tilediff,0])(
                    projection()(
                        intersection()(translate([-500,-500,start+x*thickness])(cube(size=[1000,1000,0.1])),
                            final_object
                        )
                    )
            )
            )
            
        return union()(rv)

set_mode("laser")
load_scad_objects() 
 
************************************************/
